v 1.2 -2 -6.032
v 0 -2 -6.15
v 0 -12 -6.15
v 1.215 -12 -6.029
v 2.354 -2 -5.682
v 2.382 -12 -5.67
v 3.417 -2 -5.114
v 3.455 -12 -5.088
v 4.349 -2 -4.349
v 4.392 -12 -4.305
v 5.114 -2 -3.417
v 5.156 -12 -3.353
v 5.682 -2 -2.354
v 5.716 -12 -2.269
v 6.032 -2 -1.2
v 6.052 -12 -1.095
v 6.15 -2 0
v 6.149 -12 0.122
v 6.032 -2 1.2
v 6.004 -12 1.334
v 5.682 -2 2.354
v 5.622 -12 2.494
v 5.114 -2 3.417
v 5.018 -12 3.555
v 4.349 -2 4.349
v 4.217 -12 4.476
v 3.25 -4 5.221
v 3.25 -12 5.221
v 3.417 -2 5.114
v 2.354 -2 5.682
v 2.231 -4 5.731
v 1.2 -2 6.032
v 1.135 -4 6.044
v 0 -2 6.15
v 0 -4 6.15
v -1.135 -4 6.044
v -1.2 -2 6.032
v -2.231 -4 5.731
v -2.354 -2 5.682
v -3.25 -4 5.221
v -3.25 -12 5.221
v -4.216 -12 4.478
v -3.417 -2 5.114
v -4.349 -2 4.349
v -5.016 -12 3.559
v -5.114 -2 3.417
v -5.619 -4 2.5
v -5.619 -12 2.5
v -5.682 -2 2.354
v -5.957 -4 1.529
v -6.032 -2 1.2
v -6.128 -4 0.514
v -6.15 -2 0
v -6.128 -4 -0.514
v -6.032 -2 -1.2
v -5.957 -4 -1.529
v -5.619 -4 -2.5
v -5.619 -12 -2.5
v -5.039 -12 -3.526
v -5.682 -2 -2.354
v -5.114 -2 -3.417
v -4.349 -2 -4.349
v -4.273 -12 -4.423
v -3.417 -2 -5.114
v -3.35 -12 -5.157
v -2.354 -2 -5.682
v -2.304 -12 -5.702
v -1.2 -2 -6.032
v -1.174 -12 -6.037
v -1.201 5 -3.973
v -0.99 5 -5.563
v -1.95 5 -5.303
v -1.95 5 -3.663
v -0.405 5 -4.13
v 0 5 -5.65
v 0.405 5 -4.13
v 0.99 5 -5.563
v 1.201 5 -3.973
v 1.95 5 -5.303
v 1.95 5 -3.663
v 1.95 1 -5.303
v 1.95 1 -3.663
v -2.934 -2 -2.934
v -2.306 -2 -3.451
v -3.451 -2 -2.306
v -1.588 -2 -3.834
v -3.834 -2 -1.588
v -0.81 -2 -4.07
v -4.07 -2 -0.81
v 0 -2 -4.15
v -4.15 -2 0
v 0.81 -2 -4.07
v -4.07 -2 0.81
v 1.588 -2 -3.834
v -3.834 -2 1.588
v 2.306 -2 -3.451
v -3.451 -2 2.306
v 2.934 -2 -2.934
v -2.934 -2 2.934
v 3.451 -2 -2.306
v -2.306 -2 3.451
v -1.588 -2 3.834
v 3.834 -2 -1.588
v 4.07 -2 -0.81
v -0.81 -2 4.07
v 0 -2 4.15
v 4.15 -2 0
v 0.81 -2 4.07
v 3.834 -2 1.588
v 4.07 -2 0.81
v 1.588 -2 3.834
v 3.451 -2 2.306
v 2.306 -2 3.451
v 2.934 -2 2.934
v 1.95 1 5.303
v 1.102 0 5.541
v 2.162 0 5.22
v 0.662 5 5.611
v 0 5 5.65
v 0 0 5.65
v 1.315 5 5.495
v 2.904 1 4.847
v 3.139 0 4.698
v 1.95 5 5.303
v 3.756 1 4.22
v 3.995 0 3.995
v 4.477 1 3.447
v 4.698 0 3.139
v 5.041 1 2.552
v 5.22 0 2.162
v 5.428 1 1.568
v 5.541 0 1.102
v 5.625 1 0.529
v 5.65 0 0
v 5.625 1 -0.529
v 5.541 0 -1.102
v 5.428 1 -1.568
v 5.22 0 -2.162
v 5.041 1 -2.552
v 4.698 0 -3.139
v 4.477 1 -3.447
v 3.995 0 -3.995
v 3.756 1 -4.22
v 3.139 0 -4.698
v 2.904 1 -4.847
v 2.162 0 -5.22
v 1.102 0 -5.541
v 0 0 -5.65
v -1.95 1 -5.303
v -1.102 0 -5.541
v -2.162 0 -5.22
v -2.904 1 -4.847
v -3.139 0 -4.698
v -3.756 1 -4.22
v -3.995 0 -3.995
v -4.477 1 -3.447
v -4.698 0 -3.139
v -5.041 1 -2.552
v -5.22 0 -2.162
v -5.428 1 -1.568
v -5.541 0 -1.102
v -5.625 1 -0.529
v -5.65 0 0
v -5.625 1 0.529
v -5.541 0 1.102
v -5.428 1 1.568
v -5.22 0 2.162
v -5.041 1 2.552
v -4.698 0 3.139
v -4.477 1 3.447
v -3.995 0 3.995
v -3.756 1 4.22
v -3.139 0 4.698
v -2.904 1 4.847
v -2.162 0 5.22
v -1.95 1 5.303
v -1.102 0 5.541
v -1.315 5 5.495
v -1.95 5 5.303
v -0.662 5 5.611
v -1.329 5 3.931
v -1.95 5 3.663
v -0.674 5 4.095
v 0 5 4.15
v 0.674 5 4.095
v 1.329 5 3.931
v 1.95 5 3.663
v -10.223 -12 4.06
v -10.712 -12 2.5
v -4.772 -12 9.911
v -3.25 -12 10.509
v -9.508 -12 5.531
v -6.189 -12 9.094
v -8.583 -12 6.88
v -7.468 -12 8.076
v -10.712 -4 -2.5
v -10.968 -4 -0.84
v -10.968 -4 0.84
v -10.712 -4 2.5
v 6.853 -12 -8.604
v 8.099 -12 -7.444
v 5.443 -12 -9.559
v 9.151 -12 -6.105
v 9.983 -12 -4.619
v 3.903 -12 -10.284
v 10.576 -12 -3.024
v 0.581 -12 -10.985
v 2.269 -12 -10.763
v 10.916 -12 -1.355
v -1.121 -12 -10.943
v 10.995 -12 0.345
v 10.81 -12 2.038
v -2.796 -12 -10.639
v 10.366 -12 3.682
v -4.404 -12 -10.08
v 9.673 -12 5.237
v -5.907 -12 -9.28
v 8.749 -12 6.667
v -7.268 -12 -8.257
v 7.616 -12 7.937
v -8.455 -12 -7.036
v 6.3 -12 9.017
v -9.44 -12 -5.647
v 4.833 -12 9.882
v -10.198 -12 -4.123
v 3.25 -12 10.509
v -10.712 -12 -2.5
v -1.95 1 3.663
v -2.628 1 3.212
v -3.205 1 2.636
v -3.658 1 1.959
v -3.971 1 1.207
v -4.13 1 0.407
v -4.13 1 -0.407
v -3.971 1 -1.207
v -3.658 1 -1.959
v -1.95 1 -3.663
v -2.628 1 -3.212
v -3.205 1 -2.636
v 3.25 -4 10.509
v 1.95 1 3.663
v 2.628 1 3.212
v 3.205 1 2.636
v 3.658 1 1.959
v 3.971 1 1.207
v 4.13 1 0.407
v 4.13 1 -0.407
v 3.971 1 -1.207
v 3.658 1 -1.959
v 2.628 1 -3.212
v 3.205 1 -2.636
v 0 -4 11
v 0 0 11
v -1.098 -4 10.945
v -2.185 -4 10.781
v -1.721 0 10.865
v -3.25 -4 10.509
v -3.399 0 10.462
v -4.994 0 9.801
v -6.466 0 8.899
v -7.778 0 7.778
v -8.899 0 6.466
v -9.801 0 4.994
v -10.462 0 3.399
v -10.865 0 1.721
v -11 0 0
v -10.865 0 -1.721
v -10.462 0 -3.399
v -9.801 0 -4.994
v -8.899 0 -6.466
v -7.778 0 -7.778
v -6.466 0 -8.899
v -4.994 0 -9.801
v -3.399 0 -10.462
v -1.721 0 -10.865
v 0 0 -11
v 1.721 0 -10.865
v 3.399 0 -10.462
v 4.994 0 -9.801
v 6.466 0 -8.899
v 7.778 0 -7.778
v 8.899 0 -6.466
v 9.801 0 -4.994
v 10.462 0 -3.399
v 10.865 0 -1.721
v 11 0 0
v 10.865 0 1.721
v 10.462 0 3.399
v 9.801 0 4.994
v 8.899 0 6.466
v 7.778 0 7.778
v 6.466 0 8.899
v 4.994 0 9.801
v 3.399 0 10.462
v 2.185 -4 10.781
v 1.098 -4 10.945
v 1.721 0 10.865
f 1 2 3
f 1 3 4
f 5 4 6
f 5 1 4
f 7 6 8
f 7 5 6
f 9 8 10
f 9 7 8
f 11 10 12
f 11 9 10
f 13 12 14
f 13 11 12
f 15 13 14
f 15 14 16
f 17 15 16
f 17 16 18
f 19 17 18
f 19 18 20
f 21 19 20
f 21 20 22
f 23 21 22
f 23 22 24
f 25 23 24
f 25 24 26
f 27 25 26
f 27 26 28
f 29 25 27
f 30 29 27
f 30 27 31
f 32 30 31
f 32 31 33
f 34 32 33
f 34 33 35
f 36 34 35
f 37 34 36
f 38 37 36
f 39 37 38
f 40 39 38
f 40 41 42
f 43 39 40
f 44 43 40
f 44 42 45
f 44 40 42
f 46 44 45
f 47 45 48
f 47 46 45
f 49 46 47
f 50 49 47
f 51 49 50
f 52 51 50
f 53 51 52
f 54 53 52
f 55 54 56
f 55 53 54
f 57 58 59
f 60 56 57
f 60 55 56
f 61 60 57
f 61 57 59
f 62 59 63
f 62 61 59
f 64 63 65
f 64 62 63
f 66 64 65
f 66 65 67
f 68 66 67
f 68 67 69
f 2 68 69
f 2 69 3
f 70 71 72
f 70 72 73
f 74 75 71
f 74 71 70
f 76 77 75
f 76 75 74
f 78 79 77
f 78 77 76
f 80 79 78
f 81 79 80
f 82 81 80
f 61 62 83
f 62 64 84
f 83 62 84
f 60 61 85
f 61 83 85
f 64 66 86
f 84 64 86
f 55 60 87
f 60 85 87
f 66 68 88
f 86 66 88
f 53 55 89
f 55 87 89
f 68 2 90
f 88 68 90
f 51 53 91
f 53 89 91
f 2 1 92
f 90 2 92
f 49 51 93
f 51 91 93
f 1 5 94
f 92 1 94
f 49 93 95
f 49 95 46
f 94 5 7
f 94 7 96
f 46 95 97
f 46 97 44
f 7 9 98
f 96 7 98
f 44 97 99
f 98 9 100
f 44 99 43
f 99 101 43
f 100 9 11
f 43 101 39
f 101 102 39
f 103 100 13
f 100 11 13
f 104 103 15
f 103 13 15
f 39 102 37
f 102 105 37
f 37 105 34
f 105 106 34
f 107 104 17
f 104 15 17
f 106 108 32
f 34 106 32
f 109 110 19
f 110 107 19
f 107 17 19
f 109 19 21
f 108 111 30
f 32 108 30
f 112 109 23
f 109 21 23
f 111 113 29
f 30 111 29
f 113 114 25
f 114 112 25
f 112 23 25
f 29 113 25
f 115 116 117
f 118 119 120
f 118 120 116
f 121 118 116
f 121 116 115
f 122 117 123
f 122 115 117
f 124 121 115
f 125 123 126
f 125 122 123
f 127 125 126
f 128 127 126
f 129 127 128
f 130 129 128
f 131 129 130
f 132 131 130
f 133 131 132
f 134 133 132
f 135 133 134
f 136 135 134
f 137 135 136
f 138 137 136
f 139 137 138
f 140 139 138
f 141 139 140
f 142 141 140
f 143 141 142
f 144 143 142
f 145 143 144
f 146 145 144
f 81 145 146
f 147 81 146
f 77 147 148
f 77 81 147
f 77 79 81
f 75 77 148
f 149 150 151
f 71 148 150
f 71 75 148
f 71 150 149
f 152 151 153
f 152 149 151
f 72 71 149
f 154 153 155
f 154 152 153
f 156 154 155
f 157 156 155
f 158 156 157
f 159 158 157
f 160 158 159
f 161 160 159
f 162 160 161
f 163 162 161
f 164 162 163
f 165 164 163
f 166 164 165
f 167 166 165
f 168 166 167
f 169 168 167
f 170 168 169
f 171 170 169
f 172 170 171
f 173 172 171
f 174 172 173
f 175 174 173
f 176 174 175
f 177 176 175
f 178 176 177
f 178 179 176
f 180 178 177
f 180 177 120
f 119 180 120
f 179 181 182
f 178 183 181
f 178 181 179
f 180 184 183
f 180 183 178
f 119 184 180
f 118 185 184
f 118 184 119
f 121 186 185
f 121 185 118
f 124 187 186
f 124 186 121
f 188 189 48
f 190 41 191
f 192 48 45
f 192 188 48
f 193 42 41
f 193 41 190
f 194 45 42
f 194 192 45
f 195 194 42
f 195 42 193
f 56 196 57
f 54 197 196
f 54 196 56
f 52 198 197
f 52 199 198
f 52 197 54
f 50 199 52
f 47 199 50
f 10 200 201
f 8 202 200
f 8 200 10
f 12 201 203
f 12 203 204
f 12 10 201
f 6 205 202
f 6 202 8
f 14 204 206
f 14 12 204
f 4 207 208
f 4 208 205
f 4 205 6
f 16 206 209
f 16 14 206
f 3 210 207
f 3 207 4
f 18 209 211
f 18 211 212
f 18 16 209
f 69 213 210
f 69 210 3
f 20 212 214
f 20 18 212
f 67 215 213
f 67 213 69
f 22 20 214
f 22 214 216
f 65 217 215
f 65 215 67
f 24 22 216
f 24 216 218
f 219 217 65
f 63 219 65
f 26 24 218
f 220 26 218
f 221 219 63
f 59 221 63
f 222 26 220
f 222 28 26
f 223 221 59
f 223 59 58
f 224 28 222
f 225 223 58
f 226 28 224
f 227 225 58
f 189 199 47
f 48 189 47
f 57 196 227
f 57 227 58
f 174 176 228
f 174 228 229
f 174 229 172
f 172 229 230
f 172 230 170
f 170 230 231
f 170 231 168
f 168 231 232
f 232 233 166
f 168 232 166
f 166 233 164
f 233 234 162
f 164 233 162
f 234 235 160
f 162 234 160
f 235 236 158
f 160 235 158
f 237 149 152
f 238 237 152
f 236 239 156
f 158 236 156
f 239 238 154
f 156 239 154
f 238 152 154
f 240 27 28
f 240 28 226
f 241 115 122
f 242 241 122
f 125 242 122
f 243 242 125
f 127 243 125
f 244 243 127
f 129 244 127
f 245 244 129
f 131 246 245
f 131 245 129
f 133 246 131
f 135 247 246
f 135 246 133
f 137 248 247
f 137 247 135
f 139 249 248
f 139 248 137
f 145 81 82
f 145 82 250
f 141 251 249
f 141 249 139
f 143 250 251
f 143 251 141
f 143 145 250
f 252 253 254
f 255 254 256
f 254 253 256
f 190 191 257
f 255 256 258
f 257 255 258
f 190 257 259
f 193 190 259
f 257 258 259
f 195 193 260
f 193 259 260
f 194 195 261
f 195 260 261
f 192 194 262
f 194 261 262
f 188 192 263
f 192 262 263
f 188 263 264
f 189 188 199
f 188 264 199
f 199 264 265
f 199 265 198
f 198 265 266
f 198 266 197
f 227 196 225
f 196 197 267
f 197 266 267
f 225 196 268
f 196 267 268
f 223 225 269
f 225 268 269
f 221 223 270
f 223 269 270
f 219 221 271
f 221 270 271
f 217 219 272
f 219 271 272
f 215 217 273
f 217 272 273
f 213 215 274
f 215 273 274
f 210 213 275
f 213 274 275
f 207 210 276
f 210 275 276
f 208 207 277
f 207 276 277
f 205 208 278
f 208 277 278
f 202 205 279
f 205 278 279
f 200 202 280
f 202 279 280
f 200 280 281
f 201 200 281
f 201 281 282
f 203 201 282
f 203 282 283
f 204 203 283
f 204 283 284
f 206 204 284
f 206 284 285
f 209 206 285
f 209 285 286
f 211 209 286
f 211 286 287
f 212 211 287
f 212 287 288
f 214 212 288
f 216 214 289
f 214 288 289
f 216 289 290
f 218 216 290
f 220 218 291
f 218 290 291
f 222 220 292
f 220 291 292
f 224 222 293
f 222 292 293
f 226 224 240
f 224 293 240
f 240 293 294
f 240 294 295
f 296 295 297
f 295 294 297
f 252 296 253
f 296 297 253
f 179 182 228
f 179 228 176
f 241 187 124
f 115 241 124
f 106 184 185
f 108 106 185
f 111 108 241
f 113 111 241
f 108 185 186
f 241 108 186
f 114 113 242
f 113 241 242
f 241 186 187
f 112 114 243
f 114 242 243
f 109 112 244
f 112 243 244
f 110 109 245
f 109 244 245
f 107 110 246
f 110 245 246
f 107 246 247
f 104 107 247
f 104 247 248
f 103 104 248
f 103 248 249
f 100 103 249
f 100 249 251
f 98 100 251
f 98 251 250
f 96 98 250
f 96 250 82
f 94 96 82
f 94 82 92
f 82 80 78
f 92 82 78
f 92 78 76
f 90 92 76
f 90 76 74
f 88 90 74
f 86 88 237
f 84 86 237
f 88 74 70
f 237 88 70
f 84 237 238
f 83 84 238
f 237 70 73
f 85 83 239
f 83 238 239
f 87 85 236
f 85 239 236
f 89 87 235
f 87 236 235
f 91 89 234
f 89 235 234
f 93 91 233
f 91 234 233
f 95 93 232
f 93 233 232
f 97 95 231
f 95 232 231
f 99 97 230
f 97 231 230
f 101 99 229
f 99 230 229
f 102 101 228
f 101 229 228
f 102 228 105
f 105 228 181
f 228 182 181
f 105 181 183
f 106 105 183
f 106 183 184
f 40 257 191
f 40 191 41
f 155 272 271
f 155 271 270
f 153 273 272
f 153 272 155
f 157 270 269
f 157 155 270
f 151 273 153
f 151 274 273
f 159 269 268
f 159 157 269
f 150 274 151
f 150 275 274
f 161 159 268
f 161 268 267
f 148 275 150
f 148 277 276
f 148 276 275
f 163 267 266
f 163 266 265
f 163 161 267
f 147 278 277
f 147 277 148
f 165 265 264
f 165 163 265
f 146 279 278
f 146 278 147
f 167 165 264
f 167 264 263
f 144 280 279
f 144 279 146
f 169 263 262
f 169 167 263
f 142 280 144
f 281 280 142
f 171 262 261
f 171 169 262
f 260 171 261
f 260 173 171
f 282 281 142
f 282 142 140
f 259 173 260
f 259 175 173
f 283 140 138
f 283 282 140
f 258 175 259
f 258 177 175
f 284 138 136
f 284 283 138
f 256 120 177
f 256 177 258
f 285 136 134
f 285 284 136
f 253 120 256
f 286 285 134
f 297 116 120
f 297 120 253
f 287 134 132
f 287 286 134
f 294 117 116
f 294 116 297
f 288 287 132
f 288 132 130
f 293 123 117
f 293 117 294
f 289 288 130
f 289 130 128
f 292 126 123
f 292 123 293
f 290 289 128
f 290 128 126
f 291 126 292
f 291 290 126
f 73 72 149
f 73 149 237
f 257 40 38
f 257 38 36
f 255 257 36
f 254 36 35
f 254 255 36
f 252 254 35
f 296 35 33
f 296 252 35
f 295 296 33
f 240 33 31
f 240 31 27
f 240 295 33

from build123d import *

# Parameters (mm, degrees)
SKETCH_1_R          = 11
SKETCH_1_R_2        = 4.15
EXTRUDE_1_DEPTH     = 2
EXTRUDE_START       = 5
SKETCH_1_3_R        = 5.65
SKETCH_1_3_R_2      = 4.15
EXTRUDE_2_DEPTH     = 5
CUT_EXTRUDE_1_DEPTH = 4
SKETCH_4_R          = 11
SKETCH_4_R_2        = 6.15
EXTRUDE_3_DEPTH     = 10
CUT_EXTRUDE_START   = -8
SKETCH_5_W          = 5.562300803
SKETCH_5_H          = 5
CUT_EXTRUDE_2_DEPTH = 8


with BuildPart() as part:
    # 草图1 → 凸台-拉伸1 (new body)
    with BuildSketch(Plane(origin=(0, 0, 0), x_dir=(1, 0, 0), z_dir=(0, 1, 0))):
        Circle(SKETCH_1_R)
        Circle(SKETCH_1_R_2, mode=Mode.SUBTRACT)
    extrude(amount=-EXTRUDE_1_DEPTH)

    # 草图1<3> → 凸台-拉伸2 (add)
    with BuildSketch(Plane(origin=(0, 0, 0), x_dir=(1, 0, 0), z_dir=(0, 1, 0)).offset(EXTRUDE_START)):
        Circle(SKETCH_1_3_R)
        Circle(SKETCH_1_3_R_2, mode=Mode.SUBTRACT)
    extrude(amount=-EXTRUDE_2_DEPTH)

    # 草图2 → 切除-拉伸1 (cut)
    with BuildSketch(Plane(origin=(0, 5, 0), x_dir=(1, 0, 0), z_dir=(0, 1, 0))):
        with BuildLine():
            Line((1.95, 5.302829433), (1.95, 3.663331817))
            ThreePointArc((1.95, 3.663331817), (4.15, 0), (1.95, -3.663331817))
            Line((1.95, -3.663331817), (1.95, -5.302829433))
            ThreePointArc((1.95, -5.302829433), (5.65, 0), (1.95, 5.302829433))
        make_face()
        with BuildLine():
            Line((-1.95, 5.302829433), (-1.95, 3.663331817))
            ThreePointArc((-1.95, 3.663331817), (-4.15, 0), (-1.95, -3.663331817))
            Line((-1.95, -3.663331817), (-1.95, -5.302829433))
            ThreePointArc((-1.95, -5.302829433), (-5.65, 0), (-1.95, 5.302829433))
        make_face()
    extrude(amount=-CUT_EXTRUDE_1_DEPTH, mode=Mode.SUBTRACT)

    # 草图4 → 凸台-拉伸3 (add)
    with BuildSketch(Plane.XZ.offset(2)):
        Circle(SKETCH_4_R)
        Circle(SKETCH_4_R_2, mode=Mode.SUBTRACT)
    extrude(amount=EXTRUDE_3_DEPTH)

    # 草图5 → 切除-拉伸2 (cut)
    with BuildSketch(Plane.XZ.offset(12).offset(CUT_EXTRUDE_START)):
        with Locations((-8.400091582, 0)):
            Rectangle(SKETCH_5_W, SKETCH_5_H)
        with BuildLine():
            ThreePointArc((3.25, 10.508924778), (0, 11), (-3.25, 10.508924778))
            Line((-3.25, 10.508924778), (-3.25, 5.221110993))
            ThreePointArc((-3.25, 5.221110993), (0, 6.15), (3.25, 5.221110993))
            Line((3.25, 5.221110993), (3.25, 10.508924778))
        make_face()
    extrude(amount=CUT_EXTRUDE_2_DEPTH, mode=Mode.SUBTRACT)


solid = part.part
